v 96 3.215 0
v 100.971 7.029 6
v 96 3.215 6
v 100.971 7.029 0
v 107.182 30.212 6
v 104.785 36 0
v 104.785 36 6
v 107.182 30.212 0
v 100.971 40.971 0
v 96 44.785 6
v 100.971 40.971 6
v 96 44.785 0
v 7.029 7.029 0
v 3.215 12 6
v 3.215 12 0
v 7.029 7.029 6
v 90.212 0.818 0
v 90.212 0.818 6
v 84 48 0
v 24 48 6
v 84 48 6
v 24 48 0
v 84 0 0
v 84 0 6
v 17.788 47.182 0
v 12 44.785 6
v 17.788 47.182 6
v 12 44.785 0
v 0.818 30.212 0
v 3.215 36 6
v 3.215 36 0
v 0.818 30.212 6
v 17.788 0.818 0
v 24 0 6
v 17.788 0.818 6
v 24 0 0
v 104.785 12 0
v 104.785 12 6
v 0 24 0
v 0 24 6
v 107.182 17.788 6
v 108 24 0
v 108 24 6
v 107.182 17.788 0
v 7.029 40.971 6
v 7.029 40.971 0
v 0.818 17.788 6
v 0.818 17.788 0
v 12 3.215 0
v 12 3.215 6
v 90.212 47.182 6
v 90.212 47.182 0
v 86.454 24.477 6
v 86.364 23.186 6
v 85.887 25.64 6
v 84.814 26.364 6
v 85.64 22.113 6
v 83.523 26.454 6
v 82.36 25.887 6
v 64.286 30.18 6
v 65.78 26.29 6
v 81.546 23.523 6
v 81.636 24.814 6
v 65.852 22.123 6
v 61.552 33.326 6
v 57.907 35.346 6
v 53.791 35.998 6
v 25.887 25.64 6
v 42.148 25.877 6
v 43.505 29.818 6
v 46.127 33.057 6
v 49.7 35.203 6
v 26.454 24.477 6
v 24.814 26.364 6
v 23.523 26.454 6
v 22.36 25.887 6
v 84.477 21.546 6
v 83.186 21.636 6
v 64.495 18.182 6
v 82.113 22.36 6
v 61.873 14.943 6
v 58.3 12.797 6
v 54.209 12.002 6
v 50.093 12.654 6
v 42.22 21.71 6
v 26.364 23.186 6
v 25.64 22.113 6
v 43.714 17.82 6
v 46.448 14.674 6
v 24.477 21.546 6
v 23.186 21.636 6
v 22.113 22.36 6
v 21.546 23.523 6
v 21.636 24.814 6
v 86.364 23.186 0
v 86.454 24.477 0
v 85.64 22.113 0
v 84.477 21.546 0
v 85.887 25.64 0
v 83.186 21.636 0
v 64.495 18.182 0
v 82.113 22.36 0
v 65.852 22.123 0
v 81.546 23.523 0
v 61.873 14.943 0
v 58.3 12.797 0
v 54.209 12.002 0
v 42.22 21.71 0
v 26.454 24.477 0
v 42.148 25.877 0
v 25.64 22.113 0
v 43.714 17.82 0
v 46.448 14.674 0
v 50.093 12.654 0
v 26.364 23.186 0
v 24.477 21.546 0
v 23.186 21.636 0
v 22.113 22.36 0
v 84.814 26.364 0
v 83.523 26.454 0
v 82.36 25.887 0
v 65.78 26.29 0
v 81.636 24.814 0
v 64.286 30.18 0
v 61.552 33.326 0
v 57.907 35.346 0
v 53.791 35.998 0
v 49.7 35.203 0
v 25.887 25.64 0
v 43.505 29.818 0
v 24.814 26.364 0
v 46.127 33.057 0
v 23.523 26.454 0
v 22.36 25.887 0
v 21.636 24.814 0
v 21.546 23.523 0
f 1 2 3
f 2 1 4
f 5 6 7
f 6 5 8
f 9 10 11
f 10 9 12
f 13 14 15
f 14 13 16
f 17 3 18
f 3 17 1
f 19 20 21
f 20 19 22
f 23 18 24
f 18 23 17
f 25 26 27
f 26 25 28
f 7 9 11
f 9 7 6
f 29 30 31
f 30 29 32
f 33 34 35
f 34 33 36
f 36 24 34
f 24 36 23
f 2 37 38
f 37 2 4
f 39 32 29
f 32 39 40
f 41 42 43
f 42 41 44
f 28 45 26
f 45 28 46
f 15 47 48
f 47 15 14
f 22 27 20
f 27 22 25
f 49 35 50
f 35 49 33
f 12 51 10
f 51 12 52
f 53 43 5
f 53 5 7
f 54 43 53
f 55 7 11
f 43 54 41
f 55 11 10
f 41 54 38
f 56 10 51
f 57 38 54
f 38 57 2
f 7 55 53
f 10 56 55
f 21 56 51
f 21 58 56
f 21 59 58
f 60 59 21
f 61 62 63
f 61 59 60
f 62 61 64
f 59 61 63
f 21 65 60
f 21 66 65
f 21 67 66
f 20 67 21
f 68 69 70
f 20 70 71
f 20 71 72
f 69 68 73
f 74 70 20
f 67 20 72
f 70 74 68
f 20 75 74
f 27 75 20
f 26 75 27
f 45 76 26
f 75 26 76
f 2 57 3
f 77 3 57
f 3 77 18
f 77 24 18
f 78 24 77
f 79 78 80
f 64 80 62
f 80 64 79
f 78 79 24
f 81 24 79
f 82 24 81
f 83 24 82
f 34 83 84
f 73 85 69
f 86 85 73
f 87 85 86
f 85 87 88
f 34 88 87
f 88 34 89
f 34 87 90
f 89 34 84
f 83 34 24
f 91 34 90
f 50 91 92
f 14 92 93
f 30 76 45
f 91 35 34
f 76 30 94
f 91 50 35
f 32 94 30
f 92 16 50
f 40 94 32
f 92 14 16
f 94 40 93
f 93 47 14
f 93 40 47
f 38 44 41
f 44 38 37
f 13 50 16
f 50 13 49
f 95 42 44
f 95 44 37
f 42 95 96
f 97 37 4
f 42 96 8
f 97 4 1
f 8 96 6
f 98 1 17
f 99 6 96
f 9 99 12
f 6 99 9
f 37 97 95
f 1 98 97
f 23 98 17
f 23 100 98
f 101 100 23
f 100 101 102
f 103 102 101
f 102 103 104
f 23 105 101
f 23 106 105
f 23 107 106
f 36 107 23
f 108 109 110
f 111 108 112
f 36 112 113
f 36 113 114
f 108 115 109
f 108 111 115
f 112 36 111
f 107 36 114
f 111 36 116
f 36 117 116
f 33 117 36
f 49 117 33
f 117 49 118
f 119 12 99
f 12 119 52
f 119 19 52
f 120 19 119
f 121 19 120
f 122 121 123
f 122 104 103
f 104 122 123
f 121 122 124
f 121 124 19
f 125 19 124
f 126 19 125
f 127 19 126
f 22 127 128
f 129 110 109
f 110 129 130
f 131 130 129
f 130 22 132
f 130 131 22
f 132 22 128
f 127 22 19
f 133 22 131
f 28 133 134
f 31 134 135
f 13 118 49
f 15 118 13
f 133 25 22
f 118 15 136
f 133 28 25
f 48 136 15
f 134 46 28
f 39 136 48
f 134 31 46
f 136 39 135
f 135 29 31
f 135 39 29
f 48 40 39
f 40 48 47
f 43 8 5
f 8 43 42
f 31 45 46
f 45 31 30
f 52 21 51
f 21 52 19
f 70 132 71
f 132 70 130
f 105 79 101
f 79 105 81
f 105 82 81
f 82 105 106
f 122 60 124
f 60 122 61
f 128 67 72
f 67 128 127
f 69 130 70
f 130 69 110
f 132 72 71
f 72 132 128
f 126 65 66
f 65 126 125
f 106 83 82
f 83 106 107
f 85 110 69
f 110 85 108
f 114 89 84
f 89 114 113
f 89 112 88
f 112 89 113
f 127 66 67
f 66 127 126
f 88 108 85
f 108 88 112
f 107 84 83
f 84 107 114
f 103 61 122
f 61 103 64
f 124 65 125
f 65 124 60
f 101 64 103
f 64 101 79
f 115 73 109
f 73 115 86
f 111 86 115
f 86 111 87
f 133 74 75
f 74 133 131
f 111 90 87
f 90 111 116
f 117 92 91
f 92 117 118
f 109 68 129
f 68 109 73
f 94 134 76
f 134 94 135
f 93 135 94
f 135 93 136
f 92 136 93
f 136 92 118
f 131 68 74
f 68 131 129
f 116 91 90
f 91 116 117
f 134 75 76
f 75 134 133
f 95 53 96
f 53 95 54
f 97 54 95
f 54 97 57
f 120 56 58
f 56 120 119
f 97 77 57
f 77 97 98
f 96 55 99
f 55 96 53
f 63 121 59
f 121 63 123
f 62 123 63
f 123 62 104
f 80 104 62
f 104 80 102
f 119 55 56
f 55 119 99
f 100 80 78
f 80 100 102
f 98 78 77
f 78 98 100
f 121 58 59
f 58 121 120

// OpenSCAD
$fn = 32;

// ----------------------------------------------------------------------
// Spacer plate: obround span 60, caps R24
// ----------------------------------------------------------------------

// --- parameters (mm) ---
bore_r = 12;              // centre bore radius
bolt_r = 2.5;             // bolt hole radius
plate_t = 6;              // plate thickness, Z (extrusion height)
span = 60;                // obround span
cap_r = 24;               // cap radius

profile = [[24, 48], [17.788, 47.182], [12, 44.785], [7.029, 40.971], [3.215, 36], [0.818, 30.212], [0, 24], [0.818, 17.788], [3.215, 12], [7.029, 7.029], [12, 3.215], [17.788, 0.818], [24, 0], [84, 0], [90.212, 0.818], [96, 3.215], [100.971, 7.029], [104.785, 12], [107.182, 17.788], [108, 24], [107.182, 30.212], [104.785, 36], [100.971, 40.971], [96, 44.785], [90.212, 47.182], [84, 48]];  // primary outline, 26 points, counter clockwise
void_1 = [[65.78, 26.29], [64.286, 30.18], [61.552, 33.326], [57.907, 35.346], [53.791, 35.998], [49.7, 35.203], [46.127, 33.057], [43.505, 29.818], [42.148, 25.877], [42.22, 21.71], [43.714, 17.82], [46.448, 14.674], [50.093, 12.654], [54.209, 12.002], [58.3, 12.797], [61.873, 14.943], [64.495, 18.182], [65.852, 22.123]];  // centre bore, 18 points
void_2 = [[26.454, 24.477], [25.887, 25.64], [24.814, 26.364], [23.523, 26.454], [22.36, 25.887], [21.636, 24.814], [21.546, 23.523], [22.113, 22.36], [23.186, 21.636], [24.477, 21.546], [25.64, 22.113], [26.364, 23.186]];  // end hole, 12 points
void_3 = [[86.454, 24.477], [85.887, 25.64], [84.814, 26.364], [83.523, 26.454], [82.36, 25.887], [81.636, 24.814], [81.546, 23.523], [82.113, 22.36], [83.186, 21.636], [84.477, 21.546], [85.64, 22.113], [86.364, 23.186]];  // end hole, 12 points

// --- the one profile operation ---
difference() {
  linear_extrude(height = plate_t) polygon(points = profile);
  translate([0, 0, -1])
    linear_extrude(height = plate_t + 2) polygon(points = void_1);
  translate([0, 0, -1])
    linear_extrude(height = plate_t + 2) polygon(points = void_2);
  translate([0, 0, -1])
    linear_extrude(height = plate_t + 2) polygon(points = void_3);
}
